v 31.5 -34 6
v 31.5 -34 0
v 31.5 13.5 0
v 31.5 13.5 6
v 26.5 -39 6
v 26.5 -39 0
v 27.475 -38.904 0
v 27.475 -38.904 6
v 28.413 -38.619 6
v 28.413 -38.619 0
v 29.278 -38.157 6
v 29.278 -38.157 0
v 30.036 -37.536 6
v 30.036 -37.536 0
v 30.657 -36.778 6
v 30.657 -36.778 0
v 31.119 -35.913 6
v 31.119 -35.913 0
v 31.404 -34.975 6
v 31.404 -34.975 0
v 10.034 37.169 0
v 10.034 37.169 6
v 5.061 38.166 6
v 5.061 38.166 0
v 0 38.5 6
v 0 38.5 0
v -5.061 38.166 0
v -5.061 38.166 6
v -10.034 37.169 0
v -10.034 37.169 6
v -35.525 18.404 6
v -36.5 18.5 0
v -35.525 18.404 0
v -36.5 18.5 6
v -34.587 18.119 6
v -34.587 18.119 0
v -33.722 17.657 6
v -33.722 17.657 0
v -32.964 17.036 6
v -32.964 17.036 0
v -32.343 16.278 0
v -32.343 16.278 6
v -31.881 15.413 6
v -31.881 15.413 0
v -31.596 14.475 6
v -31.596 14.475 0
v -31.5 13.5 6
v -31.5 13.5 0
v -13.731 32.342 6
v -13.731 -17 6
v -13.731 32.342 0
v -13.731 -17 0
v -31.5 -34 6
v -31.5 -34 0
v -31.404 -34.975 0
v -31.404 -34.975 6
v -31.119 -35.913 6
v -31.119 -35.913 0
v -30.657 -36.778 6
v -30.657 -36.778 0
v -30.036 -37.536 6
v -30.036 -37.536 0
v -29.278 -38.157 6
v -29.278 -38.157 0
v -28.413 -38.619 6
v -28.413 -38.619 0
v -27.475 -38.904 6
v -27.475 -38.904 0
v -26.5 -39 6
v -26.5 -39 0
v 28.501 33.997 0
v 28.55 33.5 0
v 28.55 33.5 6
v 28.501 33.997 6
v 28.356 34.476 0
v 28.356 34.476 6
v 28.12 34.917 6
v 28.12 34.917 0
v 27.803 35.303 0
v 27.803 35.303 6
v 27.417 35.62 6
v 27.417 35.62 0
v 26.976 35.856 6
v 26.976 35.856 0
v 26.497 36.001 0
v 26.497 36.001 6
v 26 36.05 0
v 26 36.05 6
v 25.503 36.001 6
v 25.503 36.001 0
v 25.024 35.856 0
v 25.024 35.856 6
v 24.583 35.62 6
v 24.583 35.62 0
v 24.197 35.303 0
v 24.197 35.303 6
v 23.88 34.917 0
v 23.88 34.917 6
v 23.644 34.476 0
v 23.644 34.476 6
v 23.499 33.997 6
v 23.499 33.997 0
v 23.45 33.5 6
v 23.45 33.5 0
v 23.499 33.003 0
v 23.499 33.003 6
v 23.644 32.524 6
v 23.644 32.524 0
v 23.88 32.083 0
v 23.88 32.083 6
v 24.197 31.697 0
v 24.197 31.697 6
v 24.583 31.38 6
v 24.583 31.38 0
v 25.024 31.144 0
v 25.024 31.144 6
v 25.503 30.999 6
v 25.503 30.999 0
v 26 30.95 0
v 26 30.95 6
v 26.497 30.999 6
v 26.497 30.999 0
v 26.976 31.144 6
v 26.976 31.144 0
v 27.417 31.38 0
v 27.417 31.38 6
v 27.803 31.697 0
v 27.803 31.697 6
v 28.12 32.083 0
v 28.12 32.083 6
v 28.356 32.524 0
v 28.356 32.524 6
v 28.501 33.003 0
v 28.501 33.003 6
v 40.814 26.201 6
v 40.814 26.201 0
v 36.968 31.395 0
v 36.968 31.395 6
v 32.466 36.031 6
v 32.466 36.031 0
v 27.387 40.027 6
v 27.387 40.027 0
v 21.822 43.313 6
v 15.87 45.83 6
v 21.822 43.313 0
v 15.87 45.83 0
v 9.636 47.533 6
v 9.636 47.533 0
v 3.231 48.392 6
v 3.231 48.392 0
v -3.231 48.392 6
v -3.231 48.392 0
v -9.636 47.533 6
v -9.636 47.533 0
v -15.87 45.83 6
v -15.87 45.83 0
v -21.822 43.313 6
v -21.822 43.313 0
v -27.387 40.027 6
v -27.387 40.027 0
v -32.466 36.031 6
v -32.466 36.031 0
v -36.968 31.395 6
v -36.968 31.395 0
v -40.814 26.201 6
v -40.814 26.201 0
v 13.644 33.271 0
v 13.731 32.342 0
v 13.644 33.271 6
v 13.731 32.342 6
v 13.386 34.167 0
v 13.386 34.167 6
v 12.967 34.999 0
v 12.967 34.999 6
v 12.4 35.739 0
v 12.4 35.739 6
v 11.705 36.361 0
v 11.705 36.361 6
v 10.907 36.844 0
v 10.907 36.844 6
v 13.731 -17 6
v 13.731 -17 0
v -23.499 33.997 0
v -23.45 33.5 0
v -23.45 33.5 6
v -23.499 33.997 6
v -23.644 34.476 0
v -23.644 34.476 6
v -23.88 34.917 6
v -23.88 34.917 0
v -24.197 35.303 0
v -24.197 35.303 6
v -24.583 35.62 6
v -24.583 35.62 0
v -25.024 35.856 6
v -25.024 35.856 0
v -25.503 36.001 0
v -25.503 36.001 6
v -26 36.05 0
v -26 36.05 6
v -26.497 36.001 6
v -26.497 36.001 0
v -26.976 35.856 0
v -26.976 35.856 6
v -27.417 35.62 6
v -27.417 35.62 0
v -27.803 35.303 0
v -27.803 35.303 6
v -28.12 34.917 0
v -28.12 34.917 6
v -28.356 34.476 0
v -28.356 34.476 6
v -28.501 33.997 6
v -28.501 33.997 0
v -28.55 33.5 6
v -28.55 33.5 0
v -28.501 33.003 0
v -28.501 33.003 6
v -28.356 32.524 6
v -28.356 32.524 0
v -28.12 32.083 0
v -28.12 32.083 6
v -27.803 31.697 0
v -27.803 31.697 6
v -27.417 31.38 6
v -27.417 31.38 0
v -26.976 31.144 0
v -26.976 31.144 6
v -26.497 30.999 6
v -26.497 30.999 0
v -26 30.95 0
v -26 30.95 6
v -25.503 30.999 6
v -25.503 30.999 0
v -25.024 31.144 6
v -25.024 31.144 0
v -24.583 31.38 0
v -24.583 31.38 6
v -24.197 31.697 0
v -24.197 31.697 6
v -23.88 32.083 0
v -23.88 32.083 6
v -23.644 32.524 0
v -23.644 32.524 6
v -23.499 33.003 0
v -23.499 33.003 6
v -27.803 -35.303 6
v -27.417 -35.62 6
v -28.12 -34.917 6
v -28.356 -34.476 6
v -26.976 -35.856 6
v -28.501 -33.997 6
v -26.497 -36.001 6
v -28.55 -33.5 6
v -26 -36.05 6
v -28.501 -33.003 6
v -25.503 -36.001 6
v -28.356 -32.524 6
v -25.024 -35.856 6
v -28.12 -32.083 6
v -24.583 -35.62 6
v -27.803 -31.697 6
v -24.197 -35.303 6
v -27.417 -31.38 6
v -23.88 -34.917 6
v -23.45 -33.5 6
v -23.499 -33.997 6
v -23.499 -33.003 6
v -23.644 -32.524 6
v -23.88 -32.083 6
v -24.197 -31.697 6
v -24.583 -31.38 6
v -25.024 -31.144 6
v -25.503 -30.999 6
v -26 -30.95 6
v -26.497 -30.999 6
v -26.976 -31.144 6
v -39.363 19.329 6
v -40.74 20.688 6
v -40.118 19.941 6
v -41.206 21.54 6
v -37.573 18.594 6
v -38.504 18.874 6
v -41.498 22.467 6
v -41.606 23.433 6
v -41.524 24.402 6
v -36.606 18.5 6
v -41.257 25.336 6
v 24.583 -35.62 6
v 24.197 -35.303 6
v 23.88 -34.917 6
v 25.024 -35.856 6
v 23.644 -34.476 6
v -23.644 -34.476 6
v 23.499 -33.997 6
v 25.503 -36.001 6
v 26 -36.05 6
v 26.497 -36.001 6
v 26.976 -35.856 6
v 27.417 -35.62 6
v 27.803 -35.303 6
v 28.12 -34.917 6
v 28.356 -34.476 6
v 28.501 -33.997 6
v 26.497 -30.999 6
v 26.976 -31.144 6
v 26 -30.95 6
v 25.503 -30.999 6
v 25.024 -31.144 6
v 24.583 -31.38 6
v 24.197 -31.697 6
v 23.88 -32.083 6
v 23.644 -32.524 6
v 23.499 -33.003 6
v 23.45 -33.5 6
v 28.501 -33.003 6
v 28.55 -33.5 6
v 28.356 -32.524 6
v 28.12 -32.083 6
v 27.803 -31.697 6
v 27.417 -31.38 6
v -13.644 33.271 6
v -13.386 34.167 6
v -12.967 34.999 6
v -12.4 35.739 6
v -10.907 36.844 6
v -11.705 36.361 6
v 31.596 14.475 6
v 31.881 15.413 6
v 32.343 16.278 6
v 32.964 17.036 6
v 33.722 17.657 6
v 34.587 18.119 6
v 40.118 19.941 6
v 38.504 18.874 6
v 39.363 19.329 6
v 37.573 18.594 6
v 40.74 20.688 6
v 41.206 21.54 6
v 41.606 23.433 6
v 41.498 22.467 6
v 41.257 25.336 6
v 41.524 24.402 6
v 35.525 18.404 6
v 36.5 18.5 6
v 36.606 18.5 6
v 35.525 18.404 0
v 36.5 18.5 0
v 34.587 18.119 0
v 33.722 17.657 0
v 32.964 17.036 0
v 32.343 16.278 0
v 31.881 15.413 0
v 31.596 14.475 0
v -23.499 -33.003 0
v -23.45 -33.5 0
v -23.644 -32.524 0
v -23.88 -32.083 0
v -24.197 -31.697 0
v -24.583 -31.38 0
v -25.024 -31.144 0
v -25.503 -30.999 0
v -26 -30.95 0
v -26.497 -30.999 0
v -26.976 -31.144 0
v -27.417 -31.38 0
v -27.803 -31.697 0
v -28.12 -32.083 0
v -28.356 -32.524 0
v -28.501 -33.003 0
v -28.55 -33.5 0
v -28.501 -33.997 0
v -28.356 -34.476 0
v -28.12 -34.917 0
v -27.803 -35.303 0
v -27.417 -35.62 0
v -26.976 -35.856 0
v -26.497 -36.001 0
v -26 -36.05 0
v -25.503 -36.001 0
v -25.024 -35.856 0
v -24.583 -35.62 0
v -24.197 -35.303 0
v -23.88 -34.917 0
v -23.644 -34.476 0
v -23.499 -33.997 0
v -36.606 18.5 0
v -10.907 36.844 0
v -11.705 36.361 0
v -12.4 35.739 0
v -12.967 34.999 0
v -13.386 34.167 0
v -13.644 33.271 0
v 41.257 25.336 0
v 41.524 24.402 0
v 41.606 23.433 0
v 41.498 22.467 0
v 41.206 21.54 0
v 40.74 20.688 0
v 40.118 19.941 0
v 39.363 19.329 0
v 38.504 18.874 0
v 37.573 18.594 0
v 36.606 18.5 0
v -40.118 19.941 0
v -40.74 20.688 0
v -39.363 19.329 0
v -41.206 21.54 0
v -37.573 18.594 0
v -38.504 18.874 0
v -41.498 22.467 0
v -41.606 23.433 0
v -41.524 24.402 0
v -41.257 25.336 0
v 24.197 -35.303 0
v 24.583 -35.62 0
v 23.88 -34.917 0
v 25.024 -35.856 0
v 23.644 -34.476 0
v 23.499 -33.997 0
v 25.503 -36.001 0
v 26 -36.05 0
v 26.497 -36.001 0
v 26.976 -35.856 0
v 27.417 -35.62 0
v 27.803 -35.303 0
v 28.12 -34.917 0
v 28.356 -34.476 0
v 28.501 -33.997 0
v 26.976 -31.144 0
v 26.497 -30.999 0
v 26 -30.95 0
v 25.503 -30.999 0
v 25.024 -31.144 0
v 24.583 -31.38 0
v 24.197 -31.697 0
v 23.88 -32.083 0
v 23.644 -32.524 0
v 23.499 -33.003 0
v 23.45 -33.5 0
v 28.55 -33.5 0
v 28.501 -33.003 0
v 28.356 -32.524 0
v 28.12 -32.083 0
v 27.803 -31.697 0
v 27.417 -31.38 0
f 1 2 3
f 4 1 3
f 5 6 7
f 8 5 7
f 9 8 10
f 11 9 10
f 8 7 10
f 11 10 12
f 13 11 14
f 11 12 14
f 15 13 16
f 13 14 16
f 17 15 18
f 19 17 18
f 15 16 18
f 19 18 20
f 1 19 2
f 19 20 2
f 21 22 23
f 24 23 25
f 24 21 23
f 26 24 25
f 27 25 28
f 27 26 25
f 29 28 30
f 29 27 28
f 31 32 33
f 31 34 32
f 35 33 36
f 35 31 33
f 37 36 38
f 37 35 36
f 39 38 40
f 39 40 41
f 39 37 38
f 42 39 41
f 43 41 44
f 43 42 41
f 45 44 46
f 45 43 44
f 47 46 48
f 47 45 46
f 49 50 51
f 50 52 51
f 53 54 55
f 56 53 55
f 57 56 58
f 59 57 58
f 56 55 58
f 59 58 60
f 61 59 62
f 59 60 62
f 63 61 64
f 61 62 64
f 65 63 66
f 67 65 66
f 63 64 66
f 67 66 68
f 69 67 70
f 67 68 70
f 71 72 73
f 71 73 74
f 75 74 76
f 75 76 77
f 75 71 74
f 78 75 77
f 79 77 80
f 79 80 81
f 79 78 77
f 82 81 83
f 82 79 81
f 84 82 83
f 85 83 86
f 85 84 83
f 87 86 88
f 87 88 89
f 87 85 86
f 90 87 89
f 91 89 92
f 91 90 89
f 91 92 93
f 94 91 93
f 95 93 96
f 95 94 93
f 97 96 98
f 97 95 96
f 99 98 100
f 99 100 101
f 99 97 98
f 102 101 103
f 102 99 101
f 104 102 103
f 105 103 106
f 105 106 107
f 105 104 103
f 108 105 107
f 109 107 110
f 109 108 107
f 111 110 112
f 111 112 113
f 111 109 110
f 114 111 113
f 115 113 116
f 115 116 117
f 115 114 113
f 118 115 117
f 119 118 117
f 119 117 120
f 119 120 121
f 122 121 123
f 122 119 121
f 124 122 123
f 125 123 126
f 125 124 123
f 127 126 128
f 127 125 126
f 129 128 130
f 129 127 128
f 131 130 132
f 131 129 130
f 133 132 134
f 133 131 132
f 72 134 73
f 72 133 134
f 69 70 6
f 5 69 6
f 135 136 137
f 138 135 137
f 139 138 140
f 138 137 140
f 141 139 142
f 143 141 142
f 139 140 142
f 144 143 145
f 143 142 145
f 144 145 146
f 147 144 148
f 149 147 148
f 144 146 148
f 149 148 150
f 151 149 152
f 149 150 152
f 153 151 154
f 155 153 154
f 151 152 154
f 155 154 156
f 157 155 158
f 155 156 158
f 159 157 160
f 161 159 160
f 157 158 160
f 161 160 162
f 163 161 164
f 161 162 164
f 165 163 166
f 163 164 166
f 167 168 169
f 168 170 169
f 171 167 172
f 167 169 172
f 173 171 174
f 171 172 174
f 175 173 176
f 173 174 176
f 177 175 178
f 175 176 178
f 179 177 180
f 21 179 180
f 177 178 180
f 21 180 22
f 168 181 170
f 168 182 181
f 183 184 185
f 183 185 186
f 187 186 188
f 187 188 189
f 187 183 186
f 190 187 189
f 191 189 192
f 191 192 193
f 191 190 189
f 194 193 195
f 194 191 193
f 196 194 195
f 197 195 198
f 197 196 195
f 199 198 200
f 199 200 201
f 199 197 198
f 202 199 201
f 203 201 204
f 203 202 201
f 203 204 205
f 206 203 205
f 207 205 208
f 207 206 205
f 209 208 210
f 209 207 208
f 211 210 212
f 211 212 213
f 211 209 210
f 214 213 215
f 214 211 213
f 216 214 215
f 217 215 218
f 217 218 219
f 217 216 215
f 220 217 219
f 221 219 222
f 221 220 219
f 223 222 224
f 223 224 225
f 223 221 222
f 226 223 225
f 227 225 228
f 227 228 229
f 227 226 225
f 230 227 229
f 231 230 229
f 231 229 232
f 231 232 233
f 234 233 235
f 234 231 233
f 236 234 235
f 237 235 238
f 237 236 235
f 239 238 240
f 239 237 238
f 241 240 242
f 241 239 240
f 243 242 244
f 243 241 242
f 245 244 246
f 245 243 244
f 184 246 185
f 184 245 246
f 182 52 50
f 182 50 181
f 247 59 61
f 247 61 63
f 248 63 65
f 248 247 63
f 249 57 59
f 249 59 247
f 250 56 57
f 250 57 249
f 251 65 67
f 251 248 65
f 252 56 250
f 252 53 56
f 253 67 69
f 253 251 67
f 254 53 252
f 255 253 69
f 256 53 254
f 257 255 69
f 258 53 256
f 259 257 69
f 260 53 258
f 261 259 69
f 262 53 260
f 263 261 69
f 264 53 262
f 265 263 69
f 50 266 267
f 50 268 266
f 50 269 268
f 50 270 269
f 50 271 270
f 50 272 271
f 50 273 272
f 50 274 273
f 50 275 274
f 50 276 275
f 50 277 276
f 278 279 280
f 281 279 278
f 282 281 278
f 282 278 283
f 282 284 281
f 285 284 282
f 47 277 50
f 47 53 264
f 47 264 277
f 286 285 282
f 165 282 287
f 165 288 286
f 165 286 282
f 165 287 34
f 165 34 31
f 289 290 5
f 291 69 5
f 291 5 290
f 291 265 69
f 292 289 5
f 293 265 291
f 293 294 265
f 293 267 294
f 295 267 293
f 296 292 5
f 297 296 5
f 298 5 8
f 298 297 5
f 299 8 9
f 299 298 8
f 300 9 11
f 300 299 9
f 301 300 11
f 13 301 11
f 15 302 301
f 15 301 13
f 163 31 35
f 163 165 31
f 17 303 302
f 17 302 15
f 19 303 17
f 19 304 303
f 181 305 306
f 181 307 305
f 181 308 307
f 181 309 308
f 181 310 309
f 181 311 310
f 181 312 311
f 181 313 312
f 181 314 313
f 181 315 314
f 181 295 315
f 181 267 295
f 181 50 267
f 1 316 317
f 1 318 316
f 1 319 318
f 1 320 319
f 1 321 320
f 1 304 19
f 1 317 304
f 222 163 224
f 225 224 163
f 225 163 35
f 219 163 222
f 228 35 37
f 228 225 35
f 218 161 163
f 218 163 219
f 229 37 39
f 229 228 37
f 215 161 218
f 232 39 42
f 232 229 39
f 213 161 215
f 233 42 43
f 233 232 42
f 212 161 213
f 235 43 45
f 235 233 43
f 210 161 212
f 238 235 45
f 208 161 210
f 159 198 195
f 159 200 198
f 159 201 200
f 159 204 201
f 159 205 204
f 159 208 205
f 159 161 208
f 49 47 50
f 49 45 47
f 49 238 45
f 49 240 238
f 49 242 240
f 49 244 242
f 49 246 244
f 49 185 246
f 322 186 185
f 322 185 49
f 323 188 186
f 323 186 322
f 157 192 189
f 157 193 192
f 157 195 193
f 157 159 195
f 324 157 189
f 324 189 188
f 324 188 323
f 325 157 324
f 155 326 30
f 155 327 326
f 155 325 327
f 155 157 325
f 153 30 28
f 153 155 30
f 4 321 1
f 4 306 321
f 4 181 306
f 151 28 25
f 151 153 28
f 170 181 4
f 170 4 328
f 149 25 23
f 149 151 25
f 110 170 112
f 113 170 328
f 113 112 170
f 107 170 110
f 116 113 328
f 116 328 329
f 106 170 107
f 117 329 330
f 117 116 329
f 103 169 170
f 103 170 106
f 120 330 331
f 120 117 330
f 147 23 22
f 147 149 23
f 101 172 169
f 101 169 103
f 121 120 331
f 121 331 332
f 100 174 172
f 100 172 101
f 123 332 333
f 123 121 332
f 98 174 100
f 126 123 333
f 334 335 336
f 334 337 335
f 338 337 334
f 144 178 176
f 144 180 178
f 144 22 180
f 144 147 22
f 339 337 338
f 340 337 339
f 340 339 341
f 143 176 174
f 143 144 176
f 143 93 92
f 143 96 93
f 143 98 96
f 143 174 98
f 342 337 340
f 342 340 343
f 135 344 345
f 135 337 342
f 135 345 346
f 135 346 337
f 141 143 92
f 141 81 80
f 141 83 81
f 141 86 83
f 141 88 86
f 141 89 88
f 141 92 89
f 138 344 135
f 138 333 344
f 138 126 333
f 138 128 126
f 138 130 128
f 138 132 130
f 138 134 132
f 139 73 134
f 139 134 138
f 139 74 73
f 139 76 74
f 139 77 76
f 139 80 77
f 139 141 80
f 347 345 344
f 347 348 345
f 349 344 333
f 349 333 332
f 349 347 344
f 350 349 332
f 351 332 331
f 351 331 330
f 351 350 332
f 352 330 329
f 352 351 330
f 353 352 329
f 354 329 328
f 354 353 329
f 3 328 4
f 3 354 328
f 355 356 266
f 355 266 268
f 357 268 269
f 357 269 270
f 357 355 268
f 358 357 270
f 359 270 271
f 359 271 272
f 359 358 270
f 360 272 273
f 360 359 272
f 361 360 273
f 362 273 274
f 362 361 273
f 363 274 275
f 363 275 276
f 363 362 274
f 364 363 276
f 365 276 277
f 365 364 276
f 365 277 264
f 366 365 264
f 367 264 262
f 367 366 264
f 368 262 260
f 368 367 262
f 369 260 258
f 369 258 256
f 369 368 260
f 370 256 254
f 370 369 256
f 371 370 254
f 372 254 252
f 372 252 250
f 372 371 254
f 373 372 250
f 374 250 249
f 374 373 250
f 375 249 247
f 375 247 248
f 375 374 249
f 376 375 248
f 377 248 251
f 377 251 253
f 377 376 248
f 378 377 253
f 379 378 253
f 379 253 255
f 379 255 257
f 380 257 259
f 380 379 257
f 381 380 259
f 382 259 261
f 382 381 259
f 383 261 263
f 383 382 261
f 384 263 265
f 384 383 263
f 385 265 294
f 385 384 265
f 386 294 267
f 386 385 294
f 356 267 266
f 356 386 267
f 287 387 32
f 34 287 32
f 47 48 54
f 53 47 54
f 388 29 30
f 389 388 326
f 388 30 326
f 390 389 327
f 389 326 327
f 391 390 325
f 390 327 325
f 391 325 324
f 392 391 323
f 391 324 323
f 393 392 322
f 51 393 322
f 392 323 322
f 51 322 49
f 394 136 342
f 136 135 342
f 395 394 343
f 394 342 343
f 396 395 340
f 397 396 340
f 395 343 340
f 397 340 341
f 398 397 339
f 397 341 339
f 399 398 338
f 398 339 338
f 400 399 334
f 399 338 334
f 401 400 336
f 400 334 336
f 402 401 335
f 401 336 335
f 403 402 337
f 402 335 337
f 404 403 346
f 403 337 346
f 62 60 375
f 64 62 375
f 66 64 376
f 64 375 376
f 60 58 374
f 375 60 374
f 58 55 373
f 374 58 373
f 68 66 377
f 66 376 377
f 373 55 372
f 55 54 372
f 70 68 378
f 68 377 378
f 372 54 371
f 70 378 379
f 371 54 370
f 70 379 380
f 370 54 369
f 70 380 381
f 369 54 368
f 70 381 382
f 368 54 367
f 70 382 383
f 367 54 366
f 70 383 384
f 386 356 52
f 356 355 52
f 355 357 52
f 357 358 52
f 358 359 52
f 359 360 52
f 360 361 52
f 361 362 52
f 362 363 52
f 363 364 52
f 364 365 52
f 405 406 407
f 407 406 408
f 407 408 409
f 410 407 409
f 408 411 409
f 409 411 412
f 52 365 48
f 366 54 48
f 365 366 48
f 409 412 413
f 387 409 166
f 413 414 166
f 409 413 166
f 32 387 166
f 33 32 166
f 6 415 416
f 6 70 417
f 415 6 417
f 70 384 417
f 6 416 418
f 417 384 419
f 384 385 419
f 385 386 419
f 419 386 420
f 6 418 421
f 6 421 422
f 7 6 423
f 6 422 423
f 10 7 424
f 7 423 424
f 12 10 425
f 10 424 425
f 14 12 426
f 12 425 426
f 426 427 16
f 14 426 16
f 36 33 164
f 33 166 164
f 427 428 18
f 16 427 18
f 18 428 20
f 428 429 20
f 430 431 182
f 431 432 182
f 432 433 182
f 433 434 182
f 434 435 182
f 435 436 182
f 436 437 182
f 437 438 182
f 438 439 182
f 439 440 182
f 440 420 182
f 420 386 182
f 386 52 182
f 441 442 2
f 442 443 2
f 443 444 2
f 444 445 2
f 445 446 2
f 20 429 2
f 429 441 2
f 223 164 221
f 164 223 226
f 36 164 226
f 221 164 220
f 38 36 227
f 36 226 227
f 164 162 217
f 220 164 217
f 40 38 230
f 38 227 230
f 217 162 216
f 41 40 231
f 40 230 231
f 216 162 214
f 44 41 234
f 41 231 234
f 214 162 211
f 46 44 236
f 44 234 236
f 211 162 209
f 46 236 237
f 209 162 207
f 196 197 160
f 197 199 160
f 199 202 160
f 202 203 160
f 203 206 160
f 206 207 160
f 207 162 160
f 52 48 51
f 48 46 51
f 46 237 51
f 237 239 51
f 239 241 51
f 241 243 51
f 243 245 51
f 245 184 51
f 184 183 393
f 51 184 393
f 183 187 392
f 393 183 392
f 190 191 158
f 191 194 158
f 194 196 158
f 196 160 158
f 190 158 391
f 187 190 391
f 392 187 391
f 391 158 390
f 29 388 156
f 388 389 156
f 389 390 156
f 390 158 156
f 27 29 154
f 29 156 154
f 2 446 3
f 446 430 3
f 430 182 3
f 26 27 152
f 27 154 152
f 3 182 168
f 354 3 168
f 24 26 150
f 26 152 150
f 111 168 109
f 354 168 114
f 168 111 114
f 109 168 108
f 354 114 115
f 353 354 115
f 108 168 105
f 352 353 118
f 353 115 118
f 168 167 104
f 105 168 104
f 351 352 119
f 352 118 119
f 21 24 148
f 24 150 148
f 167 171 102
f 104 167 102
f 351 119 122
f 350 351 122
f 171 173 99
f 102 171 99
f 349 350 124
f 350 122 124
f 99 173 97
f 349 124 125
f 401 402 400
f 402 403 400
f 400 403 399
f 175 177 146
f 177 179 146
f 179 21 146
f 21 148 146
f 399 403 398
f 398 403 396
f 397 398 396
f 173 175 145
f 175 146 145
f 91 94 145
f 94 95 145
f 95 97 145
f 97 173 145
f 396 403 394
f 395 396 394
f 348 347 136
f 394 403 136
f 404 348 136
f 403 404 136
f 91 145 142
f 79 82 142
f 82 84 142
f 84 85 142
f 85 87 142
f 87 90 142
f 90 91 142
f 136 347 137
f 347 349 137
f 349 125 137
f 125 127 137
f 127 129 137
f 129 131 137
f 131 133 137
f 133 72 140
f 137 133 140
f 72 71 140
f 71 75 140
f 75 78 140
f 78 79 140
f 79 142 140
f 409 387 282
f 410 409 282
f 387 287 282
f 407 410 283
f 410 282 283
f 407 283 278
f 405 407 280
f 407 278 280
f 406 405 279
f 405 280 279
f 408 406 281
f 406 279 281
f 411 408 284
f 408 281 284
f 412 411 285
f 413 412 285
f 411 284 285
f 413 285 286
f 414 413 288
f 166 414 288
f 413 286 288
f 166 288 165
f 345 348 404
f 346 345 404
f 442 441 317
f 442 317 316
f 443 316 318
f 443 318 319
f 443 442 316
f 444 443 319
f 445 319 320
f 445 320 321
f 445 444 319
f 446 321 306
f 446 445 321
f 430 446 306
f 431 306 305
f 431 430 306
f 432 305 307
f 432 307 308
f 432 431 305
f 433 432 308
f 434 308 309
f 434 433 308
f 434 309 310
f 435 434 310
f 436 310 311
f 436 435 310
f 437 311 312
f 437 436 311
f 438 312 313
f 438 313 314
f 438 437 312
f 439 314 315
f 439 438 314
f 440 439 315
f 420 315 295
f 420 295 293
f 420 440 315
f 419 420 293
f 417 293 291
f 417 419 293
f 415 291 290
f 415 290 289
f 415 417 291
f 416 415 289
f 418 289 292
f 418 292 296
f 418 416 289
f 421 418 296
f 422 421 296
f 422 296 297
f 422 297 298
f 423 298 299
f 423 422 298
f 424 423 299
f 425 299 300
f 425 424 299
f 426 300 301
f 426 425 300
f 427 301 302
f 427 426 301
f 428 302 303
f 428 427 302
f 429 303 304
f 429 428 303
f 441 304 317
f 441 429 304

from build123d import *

# Parameters (mm, degrees)
F0_R     = 2.55
F0_W     = 27.4615384615
F0_H     = 34
F1_DEPTH = 6
F2_R     = 2.55
F3_DEPTH = 6
F5_DEPTH = 6.001
F6_R     = 5


with BuildPart() as f1:
    # F0 (on Top) → F1 (new body)
    with BuildSketch(Plane.XY):
        with BuildLine():
            Line((26.5, 39), (-26.5, 39))
            ThreePointArc((-26.5, 39), (-30.0355339059, 37.5355339059), (-31.5, 34))
            Line((-31.5, 34), (-31.5, -34))
            ThreePointArc((-31.5, -34), (-30.0355339059, -37.5355339059), (-26.5, -39))
            Line((-26.5, -39), (26.5, -39))
            ThreePointArc((26.5, -39), (30.0355339059, -37.5355339059), (31.5, -34))
            Line((31.5, -34), (31.5, 34))
            ThreePointArc((31.5, 34), (30.0355339059, 37.5355339059), (26.5, 39))
        make_face()
        with Locations((-26, -33.5)):
            Circle(F0_R, mode=Mode.SUBTRACT)
        with Locations((26, -33.5)):
            Circle(F0_R, mode=Mode.SUBTRACT)
        Rectangle(F0_W, F0_H, mode=Mode.SUBTRACT)
        with Locations((-26, 33.5)):
            Circle(F0_R, mode=Mode.SUBTRACT)
        with Locations((26, 33.5)):
            Circle(F0_R, mode=Mode.SUBTRACT)
    extrude(amount=F1_DEPTH)

    # F2 (on Top) → F3 (join, through all)
    with BuildSketch(Plane.XY):
        with BuildLine():
            Line((-44.8330235429, 18.5), (44.8330235429, 18.5))
            ThreePointArc((44.8330235429, 18.5), (0, 48.5), (-44.8330235429, 18.5))
        make_face()
        with Locations((-26, 33.5)):
            Circle(F2_R, mode=Mode.SUBTRACT)
        with Locations((26, 33.5)):
            Circle(F2_R, mode=Mode.SUBTRACT)
    extrude(amount=F3_DEPTH)

    # F4 (on Top) → F5 (cut, through all)
    with BuildSketch(Plane.XY):
        with BuildLine():
            Line((13.7307692308, 17), (13.7307692308, 35.96826346))
            ThreePointArc((13.7307692308, 35.96826346), (0, 38.5), (-13.7307692308, 35.96826346))
            Line((-13.7307692308, 35.96826346), (-13.7307692308, 17))
            Line((-13.7307692308, 17), (13.7307692308, 17))
        make_face()
    extrude(amount=F5_DEPTH, mode=Mode.SUBTRACT)

    # F6
    f6_edges = [f1.edges().sort_by_distance(p)[0] for p in [
        (44.833024, 18.5, 3),
        (-31.5, 18.5, 3),
        (31.5, 18.5, 3),
        (13.730769, 35.968263, 3),
        (-13.730769, 35.968263, 3),
        (-44.833024, 18.5, 3),
    ]]
    fillet(f6_edges, radius=F6_R)


solid = f1.part
